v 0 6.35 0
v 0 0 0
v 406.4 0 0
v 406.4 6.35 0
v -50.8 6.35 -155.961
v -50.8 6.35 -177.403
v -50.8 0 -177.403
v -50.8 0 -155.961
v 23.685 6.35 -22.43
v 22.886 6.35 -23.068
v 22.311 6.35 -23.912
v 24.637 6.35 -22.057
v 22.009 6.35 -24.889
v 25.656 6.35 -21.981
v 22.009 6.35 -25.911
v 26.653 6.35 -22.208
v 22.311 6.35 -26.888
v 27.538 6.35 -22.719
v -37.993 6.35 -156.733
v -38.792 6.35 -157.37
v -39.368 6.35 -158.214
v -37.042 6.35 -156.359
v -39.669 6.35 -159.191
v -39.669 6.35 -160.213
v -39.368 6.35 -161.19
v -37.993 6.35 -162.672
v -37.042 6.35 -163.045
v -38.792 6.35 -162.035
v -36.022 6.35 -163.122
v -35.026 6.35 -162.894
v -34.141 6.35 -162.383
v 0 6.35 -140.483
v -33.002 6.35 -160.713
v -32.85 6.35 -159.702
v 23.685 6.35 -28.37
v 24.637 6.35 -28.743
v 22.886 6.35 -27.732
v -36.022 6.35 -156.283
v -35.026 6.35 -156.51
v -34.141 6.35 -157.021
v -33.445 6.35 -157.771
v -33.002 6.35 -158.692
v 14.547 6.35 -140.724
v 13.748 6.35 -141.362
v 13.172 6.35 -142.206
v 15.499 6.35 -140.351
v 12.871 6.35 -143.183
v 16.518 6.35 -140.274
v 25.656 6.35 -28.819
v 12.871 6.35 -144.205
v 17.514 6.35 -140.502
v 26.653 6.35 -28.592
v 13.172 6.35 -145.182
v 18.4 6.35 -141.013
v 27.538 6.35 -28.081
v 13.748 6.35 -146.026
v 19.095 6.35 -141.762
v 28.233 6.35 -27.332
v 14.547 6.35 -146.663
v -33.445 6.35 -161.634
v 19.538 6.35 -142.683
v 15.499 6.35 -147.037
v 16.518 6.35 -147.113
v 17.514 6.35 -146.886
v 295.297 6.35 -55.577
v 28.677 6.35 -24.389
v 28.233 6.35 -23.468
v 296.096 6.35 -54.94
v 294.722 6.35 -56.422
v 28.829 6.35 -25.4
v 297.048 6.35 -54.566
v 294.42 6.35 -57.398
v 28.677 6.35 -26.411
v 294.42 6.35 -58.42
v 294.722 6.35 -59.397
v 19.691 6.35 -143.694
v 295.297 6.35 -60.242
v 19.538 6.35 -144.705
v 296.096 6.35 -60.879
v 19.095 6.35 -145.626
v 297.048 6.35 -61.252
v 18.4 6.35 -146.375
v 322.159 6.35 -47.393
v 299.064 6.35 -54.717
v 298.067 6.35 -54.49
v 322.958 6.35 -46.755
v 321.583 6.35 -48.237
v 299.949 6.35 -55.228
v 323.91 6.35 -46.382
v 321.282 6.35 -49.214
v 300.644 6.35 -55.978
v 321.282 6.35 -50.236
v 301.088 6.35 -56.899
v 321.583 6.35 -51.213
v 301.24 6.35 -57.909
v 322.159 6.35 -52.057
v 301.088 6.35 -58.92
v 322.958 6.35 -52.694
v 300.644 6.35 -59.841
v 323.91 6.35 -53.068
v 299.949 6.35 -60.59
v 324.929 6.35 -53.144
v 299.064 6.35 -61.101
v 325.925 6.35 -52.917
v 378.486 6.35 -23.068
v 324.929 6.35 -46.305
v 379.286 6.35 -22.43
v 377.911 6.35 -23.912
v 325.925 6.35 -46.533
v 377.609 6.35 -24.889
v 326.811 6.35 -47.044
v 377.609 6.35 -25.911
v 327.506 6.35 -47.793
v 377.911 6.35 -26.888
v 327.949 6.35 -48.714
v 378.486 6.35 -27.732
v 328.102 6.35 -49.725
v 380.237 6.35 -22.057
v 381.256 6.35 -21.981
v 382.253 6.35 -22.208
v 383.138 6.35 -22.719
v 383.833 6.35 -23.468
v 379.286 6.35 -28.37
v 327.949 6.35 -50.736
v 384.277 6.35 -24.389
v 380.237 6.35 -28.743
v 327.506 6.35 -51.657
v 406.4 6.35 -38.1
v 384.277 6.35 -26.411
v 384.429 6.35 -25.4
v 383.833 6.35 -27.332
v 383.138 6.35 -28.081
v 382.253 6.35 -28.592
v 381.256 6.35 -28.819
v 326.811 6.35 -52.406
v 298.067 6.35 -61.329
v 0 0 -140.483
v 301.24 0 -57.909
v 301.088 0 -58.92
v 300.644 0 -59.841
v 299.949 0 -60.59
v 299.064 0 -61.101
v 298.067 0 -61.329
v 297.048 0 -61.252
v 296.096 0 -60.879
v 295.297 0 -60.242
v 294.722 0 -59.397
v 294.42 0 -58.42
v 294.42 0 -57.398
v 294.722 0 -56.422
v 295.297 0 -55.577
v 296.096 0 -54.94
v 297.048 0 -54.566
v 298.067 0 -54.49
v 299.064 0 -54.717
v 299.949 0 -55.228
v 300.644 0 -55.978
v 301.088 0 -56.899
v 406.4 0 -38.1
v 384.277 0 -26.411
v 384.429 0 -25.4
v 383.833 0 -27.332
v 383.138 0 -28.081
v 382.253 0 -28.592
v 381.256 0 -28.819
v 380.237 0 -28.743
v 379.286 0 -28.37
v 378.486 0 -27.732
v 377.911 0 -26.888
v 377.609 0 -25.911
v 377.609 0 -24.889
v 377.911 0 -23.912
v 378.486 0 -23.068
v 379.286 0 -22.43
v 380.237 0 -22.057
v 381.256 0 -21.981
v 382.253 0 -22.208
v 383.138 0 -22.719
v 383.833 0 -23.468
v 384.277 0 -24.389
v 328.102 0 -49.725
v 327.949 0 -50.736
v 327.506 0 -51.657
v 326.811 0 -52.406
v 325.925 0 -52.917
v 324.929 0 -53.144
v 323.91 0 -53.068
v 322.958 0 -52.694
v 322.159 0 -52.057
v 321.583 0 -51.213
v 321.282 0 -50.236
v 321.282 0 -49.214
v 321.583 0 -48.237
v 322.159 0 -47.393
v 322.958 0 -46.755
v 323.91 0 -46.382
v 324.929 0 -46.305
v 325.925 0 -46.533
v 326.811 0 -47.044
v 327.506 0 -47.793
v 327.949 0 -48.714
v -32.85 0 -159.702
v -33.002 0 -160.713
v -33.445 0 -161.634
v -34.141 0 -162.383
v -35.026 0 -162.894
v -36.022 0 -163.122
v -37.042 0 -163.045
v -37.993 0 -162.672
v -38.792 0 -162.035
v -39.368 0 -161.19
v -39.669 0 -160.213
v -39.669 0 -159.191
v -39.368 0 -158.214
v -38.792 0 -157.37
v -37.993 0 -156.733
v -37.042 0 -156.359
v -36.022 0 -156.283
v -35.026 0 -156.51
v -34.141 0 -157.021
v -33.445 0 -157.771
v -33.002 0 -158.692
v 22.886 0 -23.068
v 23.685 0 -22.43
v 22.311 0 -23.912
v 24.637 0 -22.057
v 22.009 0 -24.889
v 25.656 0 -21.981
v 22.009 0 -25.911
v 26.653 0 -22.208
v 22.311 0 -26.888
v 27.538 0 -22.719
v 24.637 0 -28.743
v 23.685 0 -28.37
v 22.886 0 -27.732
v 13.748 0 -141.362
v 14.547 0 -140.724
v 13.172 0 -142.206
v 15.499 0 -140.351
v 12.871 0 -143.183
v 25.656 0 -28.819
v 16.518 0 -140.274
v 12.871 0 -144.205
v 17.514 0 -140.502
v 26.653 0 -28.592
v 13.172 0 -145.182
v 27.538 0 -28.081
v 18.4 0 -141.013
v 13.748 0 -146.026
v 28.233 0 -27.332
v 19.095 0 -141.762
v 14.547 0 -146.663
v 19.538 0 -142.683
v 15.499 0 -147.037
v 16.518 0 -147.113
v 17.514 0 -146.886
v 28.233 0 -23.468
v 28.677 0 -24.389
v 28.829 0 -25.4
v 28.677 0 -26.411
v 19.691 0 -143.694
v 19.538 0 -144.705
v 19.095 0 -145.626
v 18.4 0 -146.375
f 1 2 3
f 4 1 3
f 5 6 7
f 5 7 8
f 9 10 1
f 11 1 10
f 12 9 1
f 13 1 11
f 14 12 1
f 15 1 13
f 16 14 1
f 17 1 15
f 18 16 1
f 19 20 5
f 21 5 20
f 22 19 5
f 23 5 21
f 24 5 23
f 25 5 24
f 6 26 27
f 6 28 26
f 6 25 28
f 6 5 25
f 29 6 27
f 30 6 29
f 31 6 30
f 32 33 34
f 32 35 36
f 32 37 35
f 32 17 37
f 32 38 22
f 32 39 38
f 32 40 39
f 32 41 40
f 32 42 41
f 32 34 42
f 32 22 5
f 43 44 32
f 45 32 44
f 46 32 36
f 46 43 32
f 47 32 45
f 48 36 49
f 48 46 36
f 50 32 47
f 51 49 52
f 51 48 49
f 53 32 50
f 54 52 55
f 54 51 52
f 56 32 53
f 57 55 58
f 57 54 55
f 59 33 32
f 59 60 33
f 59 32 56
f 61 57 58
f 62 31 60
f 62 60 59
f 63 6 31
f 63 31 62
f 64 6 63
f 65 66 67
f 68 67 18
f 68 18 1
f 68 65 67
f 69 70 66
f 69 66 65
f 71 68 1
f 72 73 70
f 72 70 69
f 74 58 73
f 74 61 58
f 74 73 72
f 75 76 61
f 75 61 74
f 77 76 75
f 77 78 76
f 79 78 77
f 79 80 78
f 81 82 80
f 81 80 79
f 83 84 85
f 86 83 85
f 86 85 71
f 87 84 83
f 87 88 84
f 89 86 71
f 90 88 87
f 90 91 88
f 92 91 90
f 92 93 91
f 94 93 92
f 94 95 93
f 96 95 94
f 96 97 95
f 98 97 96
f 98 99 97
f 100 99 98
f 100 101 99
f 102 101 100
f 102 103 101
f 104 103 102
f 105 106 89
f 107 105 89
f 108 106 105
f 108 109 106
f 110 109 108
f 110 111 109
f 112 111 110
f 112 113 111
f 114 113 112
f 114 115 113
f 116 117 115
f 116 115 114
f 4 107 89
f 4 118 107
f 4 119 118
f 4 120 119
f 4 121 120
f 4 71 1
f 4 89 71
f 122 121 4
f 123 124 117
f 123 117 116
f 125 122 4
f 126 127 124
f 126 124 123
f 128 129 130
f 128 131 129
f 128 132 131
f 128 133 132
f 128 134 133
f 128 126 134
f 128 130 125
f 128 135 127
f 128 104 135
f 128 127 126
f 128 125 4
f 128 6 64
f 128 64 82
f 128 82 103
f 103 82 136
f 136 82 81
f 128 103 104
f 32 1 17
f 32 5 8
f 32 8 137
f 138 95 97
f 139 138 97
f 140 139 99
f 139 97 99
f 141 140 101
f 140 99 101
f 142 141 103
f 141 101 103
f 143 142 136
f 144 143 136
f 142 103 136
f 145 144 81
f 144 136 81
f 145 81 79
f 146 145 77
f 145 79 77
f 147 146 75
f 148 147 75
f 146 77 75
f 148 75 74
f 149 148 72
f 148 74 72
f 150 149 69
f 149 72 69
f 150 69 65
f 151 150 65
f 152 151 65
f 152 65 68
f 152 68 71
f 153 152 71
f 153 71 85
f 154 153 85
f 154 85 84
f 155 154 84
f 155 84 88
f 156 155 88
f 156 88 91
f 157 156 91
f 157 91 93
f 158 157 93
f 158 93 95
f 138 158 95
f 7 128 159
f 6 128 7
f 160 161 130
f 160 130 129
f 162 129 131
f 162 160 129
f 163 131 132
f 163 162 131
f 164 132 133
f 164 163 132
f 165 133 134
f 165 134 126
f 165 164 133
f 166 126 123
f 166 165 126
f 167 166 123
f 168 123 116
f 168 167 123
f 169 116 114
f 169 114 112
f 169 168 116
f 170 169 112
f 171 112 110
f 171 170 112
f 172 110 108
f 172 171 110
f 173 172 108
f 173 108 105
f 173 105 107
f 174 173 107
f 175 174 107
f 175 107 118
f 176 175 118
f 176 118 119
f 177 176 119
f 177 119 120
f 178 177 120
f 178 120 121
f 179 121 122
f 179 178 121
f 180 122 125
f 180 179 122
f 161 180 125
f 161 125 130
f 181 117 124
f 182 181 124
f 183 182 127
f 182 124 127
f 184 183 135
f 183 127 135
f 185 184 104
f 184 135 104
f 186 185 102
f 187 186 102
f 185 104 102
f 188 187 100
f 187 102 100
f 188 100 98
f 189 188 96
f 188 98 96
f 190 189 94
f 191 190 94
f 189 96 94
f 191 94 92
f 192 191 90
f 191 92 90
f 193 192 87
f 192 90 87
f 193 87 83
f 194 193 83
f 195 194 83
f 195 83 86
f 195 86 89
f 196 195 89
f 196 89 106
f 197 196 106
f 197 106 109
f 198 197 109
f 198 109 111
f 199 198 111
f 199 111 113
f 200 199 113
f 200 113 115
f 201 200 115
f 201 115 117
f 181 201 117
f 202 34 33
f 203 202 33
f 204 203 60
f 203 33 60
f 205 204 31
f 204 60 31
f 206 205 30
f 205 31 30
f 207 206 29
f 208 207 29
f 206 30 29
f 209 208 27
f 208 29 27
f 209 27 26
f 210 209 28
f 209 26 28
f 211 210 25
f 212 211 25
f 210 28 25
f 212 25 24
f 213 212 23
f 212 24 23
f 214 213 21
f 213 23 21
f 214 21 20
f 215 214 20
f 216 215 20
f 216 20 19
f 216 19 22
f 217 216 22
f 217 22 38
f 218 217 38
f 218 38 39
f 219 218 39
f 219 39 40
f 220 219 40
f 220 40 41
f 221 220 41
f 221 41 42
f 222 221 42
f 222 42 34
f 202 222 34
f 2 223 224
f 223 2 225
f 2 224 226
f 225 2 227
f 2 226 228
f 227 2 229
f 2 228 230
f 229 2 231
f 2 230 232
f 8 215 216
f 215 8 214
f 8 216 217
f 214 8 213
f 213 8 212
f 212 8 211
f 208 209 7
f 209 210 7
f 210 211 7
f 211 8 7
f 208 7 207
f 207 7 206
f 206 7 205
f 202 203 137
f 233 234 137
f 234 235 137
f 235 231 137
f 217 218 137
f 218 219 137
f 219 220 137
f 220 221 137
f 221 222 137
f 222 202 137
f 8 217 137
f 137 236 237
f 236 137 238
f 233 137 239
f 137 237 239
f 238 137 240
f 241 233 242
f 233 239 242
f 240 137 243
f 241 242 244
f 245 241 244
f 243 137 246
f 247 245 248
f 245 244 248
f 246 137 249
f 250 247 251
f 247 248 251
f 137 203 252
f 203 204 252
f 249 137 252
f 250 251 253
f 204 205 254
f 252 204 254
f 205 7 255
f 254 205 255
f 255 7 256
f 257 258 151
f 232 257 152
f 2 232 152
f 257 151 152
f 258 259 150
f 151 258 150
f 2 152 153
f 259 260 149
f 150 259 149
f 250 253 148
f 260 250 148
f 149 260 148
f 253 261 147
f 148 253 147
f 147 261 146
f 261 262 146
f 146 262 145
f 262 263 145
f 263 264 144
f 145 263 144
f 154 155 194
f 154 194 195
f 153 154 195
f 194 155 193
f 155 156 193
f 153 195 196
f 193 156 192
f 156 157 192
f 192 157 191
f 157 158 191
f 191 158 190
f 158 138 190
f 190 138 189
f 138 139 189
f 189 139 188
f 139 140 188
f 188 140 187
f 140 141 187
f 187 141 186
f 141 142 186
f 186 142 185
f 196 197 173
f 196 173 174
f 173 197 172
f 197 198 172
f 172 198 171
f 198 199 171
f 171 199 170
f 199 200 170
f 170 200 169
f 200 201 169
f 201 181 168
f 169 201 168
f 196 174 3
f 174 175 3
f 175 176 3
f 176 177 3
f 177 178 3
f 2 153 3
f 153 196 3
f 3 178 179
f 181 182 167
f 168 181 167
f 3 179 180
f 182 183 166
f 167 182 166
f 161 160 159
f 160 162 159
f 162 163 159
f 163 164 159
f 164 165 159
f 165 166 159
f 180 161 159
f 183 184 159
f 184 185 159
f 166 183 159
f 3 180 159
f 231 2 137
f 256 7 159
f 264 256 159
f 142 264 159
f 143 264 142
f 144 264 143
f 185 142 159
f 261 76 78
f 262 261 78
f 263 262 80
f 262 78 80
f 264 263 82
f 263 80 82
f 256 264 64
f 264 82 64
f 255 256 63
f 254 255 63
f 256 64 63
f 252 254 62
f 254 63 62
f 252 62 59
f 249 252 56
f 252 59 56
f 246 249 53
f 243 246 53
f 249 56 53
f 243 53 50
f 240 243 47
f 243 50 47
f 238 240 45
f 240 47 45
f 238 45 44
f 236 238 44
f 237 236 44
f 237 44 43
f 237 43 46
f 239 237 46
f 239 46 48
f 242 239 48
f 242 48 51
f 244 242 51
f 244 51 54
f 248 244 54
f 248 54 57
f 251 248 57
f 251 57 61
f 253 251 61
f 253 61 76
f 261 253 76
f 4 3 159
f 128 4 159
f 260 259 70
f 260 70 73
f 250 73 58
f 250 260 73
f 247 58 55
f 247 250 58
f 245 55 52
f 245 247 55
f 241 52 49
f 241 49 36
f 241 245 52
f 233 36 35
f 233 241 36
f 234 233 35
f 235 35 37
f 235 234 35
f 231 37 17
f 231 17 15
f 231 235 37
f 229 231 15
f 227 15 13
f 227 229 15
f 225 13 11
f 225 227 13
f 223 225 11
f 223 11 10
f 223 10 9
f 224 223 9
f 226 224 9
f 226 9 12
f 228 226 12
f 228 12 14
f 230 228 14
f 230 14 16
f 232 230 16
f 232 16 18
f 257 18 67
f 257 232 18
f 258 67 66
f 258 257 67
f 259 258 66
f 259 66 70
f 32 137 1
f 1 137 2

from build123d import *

# Parameters (mm, degrees)
SKETCH1_R           = 3.429
BOSS_EXTRUDE1_DEPTH = 6.35
BOSS_EXTRUDE2_DEPTH = 6.35
CUT_EXTRUDE1_REACH  = 8.35
SKETCH3_R           = 3.429


with BuildPart() as part:
    # Sketch1 → Boss-Extrude1 (new body)
    with BuildSketch(Plane(origin=(0, 0, 0), x_dir=(1, 0, 0), z_dir=(0, 1, 0))):
        Polygon((0, 0), (406.4, 0), (406.4, 38.1), (0, 161.925), align=None)
        with Locations((381, 25.4)):
            Circle(SKETCH1_R, mode=Mode.SUBTRACT)
        with Locations((25.4, 25.4)):
            Circle(SKETCH1_R, mode=Mode.SUBTRACT)
    extrude(amount=BOSS_EXTRUDE1_DEPTH)

    # Sketch2 → Boss-Extrude2 (add)
    with BuildSketch(Plane(origin=(0, 6.35, 0), x_dir=(1, 0, 0), z_dir=(0, 1, 0))):
        Polygon((0, 161.925), (-50.8, 177.403125), (-50.8, 155.961232961), (0, 140.483107961), align=None)
    extrude(amount=-BOSS_EXTRUDE2_DEPTH)

    # Sketch3 → Cut-Extrude1 (cut, up to next)
    with BuildSketch(Plane(origin=(0, 6.35, 0), x_dir=(1, 0, 0), z_dir=(0, 1, 0)), mode=Mode.PRIVATE) as cut_extrude1_sk1:
        with Locations((324.672621663, 49.724892693)):
            Circle(SKETCH3_R)
    cut_extrude1_tool1 = extrude(cut_extrude1_sk1.sketch, amount=-CUT_EXTRUDE1_REACH, mode=Mode.PRIVATE) & part.part
    add(cut_extrude1_tool1.solids().sort_by_distance((324.672622, 6.35, -49.724893))[0], mode=Mode.SUBTRACT)
    # Sketch3 → Cut-Extrude1 (cut, up to next)
    with BuildSketch(Plane(origin=(0, 6.35, 0), x_dir=(1, 0, 0), z_dir=(0, 1, 0)), mode=Mode.PRIVATE) as cut_extrude1_sk2:
        with Locations((16.261590572, 143.693878729)):
            Circle(SKETCH3_R)
    cut_extrude1_tool2 = extrude(cut_extrude1_sk2.sketch, amount=-CUT_EXTRUDE1_REACH, mode=Mode.PRIVATE) & part.part
    add(cut_extrude1_tool2.solids().sort_by_distance((16.261591, 6.35, -143.693879))[0], mode=Mode.SUBTRACT)
    # Sketch3 → Cut-Extrude1 (cut, up to next)
    with BuildSketch(Plane(origin=(0, 6.35, 0), x_dir=(1, 0, 0), z_dir=(0, 1, 0)), mode=Mode.PRIVATE) as cut_extrude1_sk3:
        with Locations((297.810987833, 57.909296751)):
            Circle(SKETCH3_R)
    cut_extrude1_tool3 = extrude(cut_extrude1_sk3.sketch, amount=-CUT_EXTRUDE1_REACH, mode=Mode.PRIVATE) & part.part
    add(cut_extrude1_tool3.solids().sort_by_distance((297.810988, 6.35, -57.909297))[0], mode=Mode.SUBTRACT)
    # Sketch3 → Cut-Extrude1 (cut, up to next)
    with BuildSketch(Plane(origin=(0, 6.35, 0), x_dir=(1, 0, 0), z_dir=(0, 1, 0)), mode=Mode.PRIVATE) as cut_extrude1_sk4:
        with Locations((-36.278616697, 159.702223131)):
            Circle(SKETCH3_R)
    cut_extrude1_tool4 = extrude(cut_extrude1_sk4.sketch, amount=-CUT_EXTRUDE1_REACH, mode=Mode.PRIVATE) & part.part
    add(cut_extrude1_tool4.solids().sort_by_distance((-36.278617, 6.35, -159.702223))[0], mode=Mode.SUBTRACT)


solid = part.part
